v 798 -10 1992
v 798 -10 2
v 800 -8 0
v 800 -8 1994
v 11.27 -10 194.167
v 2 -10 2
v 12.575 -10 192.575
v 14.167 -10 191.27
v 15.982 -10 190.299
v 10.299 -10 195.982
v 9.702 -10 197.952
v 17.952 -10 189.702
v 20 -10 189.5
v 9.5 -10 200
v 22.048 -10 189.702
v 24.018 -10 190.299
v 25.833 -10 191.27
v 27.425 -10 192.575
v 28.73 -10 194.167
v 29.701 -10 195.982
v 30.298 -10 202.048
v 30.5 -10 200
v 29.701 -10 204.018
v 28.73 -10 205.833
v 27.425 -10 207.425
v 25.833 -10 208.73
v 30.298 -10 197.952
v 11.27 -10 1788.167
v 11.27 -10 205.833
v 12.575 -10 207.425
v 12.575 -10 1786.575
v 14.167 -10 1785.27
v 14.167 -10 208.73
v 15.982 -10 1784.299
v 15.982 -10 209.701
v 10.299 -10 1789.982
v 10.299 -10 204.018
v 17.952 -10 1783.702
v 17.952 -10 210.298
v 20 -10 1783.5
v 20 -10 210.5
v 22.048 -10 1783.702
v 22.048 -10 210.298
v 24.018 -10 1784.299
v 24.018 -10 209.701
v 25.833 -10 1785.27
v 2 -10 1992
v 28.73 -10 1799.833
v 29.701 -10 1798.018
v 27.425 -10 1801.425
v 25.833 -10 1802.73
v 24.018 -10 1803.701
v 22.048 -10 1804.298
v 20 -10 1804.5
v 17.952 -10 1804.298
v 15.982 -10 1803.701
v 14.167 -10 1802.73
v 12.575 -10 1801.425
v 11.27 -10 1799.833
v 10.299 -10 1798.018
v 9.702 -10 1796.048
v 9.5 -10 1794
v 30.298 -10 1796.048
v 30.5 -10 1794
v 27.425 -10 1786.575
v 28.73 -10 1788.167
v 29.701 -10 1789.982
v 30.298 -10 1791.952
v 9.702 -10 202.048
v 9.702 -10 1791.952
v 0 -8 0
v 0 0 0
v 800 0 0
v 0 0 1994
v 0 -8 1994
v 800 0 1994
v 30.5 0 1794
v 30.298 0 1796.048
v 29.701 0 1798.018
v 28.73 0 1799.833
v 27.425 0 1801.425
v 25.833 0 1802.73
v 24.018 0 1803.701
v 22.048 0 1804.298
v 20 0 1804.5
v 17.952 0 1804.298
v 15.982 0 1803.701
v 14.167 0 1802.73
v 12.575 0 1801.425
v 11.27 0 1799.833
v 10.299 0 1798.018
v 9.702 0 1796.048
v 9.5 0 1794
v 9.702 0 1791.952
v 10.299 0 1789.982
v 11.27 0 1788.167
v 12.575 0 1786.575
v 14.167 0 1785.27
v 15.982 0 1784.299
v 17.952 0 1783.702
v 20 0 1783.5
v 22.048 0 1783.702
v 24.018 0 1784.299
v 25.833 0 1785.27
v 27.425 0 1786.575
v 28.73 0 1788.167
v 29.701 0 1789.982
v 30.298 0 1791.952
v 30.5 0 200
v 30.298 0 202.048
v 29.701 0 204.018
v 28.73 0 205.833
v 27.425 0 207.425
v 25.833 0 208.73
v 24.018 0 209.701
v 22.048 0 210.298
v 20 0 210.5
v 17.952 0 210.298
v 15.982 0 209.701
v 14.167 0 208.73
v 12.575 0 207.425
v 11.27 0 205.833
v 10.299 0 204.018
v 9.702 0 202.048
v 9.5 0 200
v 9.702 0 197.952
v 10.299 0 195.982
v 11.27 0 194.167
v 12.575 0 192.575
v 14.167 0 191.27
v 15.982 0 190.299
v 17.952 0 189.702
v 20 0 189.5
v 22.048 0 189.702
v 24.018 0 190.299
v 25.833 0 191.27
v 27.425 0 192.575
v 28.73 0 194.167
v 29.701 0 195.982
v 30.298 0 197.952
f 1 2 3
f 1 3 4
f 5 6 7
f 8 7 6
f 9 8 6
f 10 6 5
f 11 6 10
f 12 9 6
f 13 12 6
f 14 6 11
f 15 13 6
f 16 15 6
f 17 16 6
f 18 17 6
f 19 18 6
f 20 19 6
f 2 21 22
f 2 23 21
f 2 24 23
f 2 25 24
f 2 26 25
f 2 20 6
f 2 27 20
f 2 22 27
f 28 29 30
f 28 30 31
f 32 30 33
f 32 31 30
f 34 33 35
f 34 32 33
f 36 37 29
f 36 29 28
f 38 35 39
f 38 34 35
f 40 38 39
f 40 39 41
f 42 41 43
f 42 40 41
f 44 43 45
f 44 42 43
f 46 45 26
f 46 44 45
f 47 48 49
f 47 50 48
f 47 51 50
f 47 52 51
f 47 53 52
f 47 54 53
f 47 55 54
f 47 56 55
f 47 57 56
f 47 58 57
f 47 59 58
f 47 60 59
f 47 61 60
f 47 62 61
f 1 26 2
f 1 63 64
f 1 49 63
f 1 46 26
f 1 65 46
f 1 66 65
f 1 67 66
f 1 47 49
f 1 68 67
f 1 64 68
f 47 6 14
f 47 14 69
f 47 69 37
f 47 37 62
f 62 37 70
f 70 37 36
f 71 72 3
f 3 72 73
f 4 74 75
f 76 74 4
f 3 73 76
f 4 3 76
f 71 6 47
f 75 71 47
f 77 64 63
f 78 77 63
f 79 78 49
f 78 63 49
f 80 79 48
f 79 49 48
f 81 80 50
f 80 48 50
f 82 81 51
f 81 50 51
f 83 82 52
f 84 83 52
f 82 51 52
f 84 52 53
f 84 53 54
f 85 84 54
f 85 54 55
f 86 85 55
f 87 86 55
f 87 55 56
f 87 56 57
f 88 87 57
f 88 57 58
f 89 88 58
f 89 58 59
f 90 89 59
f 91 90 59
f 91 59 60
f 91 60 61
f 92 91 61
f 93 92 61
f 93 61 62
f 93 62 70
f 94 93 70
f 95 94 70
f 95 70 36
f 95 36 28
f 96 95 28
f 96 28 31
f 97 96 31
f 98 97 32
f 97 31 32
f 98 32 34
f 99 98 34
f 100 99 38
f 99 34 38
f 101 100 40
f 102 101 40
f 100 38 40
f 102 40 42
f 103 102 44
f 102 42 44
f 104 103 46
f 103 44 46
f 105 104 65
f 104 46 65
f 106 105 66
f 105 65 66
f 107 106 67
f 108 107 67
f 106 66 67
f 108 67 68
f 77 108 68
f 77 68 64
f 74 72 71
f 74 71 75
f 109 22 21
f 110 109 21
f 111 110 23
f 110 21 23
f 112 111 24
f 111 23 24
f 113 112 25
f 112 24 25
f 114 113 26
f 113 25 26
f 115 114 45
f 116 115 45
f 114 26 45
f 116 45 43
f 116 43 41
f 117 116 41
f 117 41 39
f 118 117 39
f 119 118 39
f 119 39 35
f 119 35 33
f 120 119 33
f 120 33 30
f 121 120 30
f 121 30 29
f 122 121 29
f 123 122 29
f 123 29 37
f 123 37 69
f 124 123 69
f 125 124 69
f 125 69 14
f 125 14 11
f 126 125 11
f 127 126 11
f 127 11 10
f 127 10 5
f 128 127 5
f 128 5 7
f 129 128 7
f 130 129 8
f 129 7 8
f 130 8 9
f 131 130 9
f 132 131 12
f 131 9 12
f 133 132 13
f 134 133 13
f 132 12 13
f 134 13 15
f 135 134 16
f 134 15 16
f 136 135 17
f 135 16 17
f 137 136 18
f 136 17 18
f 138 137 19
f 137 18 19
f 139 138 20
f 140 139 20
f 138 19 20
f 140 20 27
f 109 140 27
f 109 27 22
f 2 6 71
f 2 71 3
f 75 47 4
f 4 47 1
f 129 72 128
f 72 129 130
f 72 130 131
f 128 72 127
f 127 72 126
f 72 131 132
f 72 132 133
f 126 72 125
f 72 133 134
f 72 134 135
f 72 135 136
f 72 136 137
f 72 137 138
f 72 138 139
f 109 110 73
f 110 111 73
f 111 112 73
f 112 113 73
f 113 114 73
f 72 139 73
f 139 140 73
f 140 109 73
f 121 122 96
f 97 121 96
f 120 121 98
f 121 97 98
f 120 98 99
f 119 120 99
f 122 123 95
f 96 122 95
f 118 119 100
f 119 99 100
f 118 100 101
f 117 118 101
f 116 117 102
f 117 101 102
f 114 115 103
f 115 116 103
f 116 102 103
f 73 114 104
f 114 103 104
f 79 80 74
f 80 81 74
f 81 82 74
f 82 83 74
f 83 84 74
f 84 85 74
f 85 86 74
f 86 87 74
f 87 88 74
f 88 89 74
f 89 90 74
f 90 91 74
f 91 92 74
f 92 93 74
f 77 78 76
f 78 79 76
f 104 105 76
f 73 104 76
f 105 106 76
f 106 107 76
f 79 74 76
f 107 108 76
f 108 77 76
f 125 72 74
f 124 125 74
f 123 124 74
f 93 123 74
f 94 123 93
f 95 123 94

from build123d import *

# Parameters (mm, degrees)
F0_W     = 800
F0_H     = 1994
F1_DEPTH = 10
F2_SIZE  = 2
F3_R     = 10.5
F4_DEPTH = 25


with BuildPart() as f1:
    # F0 (on Front) → F1 (new body)
    with BuildSketch(Plane.XZ):
        with Locations((400, 997)):
            Rectangle(F0_W, F0_H)
    extrude(amount=F1_DEPTH)

    # F2
    f2_edges = [f1.edges().sort_by_distance(p)[0] for p in [
        (0, -10, 997),
        (400, -10, 0),
        (800, -10, 997),
        (400, -10, 1994),
    ]]
    chamfer(f2_edges, length=F2_SIZE)

    # F3 (on face) → F4 (cut)
    with BuildSketch(Plane.XZ.offset(10)):
        with Locations((20, 1794)):
            Circle(F3_R)
        with Locations((20, 200)):
            Circle(F3_R)
    extrude(amount=-F4_DEPTH, mode=Mode.SUBTRACT)


solid = f1.part
